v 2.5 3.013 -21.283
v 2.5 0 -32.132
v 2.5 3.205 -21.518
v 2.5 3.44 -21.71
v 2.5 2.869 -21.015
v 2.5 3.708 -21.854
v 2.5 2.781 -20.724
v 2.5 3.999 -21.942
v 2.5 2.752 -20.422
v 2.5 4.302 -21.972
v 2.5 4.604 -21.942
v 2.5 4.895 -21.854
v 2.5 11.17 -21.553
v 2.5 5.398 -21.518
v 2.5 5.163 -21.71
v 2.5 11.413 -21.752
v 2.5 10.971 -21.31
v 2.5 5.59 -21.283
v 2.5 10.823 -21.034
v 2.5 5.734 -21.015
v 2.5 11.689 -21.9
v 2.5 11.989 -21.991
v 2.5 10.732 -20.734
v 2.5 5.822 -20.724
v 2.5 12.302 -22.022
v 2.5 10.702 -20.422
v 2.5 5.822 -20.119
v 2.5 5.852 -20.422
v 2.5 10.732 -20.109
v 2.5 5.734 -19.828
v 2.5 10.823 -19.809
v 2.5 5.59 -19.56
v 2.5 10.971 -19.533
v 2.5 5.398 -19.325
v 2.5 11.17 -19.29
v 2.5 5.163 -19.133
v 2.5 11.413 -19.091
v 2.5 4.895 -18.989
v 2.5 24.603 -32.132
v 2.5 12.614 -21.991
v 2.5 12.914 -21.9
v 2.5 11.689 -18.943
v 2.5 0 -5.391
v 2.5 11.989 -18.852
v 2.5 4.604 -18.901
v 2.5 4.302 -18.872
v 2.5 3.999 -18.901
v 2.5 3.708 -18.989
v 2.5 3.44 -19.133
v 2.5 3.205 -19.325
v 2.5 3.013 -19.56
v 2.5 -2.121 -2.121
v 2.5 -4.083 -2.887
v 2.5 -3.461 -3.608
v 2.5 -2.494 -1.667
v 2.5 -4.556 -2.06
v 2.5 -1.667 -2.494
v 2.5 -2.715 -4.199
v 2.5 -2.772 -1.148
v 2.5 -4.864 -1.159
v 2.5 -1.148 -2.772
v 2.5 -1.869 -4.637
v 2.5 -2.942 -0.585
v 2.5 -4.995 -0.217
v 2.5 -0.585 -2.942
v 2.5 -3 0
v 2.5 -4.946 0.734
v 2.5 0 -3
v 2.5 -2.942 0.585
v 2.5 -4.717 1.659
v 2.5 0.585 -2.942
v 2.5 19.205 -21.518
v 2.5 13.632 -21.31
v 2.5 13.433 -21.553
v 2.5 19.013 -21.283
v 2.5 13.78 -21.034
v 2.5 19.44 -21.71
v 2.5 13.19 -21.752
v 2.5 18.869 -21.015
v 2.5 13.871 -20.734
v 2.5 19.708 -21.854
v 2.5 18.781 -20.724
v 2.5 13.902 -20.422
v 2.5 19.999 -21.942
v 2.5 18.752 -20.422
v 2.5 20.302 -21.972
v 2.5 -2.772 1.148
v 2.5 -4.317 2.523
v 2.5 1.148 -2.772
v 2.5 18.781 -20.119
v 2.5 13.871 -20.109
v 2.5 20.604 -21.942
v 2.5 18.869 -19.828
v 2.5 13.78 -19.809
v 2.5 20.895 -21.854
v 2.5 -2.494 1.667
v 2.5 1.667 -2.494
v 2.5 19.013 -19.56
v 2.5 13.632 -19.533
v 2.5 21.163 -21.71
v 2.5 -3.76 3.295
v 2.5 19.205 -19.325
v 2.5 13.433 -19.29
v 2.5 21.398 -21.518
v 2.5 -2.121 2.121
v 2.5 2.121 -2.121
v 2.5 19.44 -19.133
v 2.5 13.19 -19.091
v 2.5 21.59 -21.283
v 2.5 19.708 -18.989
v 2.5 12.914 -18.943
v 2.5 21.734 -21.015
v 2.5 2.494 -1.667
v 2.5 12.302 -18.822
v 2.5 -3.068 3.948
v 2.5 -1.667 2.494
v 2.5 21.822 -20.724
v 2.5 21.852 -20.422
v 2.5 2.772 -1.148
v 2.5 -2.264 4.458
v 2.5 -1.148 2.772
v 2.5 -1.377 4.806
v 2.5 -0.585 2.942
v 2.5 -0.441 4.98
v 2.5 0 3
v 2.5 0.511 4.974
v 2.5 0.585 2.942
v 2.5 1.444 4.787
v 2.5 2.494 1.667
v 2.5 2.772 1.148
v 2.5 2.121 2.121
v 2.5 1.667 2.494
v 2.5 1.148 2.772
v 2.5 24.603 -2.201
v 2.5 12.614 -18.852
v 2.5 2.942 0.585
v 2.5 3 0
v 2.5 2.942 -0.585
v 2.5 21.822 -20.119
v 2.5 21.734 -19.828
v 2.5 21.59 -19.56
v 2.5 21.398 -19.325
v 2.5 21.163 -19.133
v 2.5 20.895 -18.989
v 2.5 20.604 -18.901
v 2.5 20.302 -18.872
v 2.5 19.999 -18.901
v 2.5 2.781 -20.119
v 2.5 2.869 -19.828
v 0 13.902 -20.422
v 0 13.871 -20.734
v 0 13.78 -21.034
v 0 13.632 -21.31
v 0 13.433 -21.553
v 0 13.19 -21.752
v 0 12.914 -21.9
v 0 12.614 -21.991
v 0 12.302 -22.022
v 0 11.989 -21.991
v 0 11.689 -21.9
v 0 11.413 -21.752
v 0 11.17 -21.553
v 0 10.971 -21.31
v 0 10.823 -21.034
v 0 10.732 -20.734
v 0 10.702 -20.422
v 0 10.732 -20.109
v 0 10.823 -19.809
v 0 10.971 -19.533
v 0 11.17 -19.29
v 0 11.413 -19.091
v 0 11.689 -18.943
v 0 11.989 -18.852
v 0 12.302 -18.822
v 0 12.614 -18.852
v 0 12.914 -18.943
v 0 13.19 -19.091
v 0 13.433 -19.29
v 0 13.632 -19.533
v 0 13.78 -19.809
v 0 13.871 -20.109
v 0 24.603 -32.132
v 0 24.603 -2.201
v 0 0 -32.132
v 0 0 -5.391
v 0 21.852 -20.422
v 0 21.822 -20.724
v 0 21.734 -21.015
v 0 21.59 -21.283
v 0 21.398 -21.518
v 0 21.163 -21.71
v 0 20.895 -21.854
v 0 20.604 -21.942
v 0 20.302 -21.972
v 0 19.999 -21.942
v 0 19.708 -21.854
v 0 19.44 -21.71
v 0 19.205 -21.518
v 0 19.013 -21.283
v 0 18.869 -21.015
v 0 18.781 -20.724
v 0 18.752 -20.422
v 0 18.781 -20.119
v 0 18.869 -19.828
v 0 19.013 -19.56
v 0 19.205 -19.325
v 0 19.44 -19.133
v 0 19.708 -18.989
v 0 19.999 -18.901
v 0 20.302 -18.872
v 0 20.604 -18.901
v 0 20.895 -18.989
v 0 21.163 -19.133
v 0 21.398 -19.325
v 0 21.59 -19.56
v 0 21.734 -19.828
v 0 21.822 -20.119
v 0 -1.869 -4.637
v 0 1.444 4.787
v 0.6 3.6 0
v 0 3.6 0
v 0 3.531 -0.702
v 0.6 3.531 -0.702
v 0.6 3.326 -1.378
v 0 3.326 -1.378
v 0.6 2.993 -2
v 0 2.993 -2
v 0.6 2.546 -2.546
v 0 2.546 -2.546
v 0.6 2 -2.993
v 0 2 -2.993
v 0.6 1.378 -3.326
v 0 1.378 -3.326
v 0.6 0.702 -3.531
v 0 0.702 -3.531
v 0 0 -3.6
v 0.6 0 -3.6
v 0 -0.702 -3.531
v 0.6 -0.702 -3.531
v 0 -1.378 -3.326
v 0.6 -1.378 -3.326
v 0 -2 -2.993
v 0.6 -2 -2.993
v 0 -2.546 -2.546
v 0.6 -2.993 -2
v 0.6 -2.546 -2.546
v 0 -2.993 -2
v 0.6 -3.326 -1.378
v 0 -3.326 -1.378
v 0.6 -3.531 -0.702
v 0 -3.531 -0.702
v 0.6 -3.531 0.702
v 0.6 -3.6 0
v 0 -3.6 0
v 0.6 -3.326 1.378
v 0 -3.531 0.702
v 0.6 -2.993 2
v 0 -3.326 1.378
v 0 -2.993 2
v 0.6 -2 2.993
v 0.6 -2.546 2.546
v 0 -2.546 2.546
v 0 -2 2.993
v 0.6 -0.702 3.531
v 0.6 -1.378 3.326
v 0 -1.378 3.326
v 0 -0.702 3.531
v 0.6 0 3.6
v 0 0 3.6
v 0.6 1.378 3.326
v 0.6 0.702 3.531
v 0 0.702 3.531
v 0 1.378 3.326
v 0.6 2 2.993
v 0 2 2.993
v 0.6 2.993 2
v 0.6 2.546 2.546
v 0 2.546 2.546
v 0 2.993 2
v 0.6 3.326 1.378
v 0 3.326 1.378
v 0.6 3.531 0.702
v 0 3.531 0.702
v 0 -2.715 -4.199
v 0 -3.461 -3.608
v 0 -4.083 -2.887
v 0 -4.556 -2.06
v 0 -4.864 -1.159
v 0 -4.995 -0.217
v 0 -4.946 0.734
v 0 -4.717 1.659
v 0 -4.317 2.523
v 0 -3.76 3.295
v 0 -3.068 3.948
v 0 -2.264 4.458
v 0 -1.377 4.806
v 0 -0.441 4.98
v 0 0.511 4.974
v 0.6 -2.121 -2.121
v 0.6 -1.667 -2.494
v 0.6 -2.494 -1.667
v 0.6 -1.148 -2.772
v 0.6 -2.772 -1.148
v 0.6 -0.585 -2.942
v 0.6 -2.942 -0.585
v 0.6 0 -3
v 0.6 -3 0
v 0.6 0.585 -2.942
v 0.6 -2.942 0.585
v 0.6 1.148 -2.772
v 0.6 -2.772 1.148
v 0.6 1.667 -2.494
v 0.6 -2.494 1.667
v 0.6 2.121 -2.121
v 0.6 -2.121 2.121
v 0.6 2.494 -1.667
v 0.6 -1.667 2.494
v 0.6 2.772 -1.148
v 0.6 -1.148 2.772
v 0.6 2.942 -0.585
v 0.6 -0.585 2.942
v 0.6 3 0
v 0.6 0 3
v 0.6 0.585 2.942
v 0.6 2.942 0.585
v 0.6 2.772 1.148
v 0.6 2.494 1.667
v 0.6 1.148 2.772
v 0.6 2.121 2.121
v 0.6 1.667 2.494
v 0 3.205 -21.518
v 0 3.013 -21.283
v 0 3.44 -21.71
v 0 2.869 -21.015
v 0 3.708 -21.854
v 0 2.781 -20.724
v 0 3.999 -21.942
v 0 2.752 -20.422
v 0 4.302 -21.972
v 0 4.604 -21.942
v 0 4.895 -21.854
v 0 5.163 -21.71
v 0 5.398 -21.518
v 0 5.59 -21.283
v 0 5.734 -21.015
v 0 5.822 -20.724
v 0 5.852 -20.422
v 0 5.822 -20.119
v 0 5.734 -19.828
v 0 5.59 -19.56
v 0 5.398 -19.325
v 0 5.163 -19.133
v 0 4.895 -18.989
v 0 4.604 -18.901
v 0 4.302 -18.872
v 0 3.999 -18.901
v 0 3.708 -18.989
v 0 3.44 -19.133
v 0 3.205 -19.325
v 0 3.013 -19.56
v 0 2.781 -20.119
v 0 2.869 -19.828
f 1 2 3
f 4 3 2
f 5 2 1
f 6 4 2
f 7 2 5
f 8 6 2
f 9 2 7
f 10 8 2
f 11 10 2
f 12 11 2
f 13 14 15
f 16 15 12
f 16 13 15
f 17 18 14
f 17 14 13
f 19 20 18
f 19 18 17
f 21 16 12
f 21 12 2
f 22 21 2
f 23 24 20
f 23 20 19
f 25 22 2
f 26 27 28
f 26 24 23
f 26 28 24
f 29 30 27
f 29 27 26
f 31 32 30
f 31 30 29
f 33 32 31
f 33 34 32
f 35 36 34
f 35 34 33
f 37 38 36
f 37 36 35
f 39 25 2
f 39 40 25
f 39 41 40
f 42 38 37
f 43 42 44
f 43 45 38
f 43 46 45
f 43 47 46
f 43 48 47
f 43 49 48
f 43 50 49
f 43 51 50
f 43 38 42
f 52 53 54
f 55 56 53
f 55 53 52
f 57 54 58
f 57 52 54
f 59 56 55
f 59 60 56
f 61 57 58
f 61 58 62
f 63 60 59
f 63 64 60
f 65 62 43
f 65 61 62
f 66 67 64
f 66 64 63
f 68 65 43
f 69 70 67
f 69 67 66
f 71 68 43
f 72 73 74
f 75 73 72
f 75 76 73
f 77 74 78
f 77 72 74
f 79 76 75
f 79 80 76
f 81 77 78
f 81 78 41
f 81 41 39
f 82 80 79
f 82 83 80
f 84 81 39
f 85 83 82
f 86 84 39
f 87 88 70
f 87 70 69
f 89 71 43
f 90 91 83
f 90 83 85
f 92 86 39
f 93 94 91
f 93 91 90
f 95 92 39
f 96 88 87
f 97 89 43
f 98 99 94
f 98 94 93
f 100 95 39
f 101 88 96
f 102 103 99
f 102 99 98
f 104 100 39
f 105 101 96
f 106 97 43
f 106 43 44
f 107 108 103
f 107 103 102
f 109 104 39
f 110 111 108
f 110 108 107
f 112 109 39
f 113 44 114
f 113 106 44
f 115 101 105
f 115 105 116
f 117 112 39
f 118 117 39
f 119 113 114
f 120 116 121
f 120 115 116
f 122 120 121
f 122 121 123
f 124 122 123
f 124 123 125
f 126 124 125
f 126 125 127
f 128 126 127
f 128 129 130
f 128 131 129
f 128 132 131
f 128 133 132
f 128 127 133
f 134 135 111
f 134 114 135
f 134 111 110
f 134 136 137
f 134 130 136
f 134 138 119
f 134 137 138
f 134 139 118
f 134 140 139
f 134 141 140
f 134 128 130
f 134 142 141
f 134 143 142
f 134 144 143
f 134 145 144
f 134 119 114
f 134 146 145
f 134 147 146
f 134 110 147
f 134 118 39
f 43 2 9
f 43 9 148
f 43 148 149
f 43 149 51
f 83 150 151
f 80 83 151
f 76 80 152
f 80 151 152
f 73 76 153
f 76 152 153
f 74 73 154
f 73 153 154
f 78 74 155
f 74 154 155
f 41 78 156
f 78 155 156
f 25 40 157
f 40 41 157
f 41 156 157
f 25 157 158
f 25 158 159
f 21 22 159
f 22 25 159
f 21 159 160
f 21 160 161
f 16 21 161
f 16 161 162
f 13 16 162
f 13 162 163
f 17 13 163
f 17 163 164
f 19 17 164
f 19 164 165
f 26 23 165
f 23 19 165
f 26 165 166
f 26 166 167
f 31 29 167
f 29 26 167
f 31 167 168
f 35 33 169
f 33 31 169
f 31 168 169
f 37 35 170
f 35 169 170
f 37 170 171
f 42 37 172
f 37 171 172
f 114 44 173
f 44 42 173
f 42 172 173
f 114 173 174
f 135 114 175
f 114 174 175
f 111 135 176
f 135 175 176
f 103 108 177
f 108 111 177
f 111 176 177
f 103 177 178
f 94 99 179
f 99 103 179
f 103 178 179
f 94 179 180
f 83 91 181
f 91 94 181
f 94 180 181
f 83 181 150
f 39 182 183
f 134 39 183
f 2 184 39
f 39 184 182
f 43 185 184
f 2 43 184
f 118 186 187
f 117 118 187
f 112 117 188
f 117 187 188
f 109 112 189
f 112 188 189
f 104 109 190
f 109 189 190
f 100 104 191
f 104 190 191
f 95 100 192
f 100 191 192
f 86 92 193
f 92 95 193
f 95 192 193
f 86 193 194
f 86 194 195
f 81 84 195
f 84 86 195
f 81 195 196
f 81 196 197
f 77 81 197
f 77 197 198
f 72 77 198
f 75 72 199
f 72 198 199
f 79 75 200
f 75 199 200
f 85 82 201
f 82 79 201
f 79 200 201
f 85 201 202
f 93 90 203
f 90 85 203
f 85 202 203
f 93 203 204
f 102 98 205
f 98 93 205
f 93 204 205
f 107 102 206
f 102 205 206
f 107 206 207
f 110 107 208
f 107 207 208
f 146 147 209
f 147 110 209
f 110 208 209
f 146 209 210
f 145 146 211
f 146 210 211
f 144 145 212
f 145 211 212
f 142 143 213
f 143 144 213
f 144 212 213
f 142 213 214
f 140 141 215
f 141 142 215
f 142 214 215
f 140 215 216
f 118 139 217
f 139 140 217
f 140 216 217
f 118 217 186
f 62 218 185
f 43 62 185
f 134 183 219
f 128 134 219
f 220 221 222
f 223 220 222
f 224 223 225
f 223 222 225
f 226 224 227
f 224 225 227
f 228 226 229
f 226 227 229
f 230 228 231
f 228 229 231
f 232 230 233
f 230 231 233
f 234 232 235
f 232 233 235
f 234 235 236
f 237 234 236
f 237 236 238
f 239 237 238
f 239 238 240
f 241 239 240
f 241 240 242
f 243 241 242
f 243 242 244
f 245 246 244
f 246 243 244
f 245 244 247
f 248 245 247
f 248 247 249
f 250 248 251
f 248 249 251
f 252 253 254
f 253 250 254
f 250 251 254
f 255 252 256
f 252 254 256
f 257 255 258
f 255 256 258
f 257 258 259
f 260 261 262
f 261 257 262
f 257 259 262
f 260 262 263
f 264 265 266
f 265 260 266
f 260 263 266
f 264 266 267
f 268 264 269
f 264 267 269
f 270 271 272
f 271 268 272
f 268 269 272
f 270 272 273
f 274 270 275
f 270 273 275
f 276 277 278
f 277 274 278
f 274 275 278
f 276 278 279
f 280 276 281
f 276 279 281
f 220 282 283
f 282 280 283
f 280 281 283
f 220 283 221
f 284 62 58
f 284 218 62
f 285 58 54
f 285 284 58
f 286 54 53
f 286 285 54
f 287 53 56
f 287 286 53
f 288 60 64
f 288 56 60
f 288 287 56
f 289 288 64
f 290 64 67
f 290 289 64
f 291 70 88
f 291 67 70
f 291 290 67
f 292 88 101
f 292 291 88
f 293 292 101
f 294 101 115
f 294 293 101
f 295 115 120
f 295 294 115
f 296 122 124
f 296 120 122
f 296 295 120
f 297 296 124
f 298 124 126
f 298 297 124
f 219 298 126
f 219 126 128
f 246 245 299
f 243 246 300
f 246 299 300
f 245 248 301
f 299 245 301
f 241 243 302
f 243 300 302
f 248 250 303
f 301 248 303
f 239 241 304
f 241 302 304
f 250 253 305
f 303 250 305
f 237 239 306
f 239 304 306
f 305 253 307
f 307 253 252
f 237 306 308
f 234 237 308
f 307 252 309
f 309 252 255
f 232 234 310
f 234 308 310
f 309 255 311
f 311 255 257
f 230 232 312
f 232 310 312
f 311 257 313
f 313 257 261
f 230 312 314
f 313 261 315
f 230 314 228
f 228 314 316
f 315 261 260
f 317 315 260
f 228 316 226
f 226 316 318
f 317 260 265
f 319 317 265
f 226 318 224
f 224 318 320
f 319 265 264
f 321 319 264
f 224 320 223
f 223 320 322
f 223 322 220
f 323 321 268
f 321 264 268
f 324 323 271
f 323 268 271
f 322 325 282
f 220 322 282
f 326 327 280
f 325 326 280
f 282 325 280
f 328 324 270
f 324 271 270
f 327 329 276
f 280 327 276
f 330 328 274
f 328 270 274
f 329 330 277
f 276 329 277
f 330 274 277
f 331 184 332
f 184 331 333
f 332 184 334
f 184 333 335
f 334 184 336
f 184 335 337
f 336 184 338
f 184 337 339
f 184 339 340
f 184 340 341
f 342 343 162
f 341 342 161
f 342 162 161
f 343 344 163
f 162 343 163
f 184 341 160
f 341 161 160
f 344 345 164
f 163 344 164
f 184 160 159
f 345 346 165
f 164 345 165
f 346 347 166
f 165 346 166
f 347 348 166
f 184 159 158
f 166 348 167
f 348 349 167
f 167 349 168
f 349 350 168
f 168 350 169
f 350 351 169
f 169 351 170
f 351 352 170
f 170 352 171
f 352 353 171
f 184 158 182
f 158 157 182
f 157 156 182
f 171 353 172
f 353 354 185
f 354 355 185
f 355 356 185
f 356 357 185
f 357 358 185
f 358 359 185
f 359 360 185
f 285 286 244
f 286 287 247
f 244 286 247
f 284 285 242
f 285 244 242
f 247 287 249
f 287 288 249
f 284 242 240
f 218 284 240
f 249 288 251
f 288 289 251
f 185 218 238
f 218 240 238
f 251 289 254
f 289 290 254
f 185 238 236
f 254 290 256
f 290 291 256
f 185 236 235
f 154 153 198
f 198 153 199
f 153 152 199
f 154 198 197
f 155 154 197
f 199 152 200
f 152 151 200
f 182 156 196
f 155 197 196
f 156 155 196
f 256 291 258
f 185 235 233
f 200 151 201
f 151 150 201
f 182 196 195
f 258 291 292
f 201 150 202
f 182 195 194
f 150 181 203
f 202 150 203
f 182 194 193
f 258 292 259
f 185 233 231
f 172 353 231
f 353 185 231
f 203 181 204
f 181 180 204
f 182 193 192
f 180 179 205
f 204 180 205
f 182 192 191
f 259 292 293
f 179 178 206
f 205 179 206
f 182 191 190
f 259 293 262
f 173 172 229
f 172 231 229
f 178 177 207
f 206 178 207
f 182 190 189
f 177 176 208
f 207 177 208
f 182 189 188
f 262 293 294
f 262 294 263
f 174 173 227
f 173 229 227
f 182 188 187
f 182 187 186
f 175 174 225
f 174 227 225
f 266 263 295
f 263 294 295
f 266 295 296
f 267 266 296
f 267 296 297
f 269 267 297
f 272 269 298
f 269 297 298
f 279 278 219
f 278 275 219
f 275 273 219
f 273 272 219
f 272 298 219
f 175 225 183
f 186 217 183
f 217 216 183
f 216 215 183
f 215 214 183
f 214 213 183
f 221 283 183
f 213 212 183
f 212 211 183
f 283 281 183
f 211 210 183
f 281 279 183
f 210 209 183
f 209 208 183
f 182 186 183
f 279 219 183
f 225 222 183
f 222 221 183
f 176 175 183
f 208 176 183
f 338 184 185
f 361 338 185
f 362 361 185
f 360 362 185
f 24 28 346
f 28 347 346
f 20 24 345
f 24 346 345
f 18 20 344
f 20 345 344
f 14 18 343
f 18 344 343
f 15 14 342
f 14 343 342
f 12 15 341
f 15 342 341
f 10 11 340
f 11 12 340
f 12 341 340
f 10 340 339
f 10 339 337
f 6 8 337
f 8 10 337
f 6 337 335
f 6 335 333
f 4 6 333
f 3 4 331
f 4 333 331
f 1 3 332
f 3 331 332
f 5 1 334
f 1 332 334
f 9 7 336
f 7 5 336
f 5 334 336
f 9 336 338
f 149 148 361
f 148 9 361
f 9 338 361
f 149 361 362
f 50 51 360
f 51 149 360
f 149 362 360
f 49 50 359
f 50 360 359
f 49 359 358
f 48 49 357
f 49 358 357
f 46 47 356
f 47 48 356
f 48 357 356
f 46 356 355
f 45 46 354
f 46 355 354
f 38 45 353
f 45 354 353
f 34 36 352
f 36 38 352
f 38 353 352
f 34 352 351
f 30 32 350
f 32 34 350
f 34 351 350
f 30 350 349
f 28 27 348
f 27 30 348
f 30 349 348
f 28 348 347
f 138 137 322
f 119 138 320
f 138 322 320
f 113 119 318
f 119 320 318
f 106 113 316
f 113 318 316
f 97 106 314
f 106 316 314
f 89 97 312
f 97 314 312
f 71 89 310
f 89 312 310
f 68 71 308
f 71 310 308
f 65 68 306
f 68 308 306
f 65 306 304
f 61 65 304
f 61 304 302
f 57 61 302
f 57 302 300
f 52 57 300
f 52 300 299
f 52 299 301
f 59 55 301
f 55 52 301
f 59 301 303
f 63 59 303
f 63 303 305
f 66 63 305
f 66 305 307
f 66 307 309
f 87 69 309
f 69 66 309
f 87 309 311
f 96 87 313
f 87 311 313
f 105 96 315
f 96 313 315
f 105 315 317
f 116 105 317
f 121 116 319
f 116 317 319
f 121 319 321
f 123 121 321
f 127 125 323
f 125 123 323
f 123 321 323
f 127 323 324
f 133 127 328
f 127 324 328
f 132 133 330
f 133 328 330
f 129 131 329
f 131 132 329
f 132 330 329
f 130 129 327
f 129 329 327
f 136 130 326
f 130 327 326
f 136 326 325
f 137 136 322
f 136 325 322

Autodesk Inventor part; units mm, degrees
ref_plane "YZ Plane" through (0, 0, 0) normal (1, 0, 0) x (0, 1, 0)
ref_plane "XZ Plane" through (0, 0, 0) normal (0, 1, 0) x (-1, 0, 0)
ref_plane "XY Plane" through (0, 0, 0) normal (0, 0, 1) x (1, 0, 0)
sketch "スケッチ1" plane through (0, 0, 0) normal (1, 0, 0) x (0, 1, 0)
  circle A0 centre (0, 0) radius 5 construction
  circle A1 centre (0, 0) radius 3.6
  arc A2 (1.4444, 4.7868) -> (-1.8694, -4.6374) centre (0, 0) ccw
  line L0 (-1.8694, -4.6374) -> (0, -5.391)
  line L1 (0, -5.391) -> (0, -32.1321)
  line L2 (0, -32.1321) -> (24.603, -32.1321)
  line L3 (24.603, -32.1321) -> (24.603, -2.2012)
  line L4 (24.603, -2.2012) -> (1.4444, 4.7868)
  circle A3 centre (0, 0) radius 3
  circle A4 centre (12.3015, -20.4215) radius 1.6
  circle A5 centre (12.3015, -20.4215) radius 8 construction
  circle A6 centre (20.3015, -20.4215) radius 1.55
  line L5 (20.3015, -20.4215) -> (4.3015, -20.4215) construction
  circle A7 centre (4.3015, -20.4215) radius 1.55
  circle A8 centre (12.3015, -20.4215) radius 14 construction
  dimension "d1" = 10
  dimension "d0" = 7.2
  dimension "d4" = 6
  dimension "d7" = 3.2
  dimension "d8" = 16
  dimension "d9" = 3.1
  dimension "d10" = 28
extrude "押し出し1" add sketch "スケッチ1" along normal blind 2.5 contours A1 | L4 L3 L2 L1 L0 A2
extrude "押し出し2" cut sketch "スケッチ1" along normal blind 0.6 contours A1 | A3
properties part number "Gear_Frame"
